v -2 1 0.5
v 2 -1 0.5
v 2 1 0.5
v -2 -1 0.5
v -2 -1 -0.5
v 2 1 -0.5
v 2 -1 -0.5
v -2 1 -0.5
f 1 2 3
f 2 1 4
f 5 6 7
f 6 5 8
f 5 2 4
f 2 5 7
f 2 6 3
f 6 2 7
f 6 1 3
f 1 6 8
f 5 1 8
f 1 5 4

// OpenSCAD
union() {
    cube(size=[4.0, 2.0, 1.0], center=true);
    circle(r=1.0);
};
